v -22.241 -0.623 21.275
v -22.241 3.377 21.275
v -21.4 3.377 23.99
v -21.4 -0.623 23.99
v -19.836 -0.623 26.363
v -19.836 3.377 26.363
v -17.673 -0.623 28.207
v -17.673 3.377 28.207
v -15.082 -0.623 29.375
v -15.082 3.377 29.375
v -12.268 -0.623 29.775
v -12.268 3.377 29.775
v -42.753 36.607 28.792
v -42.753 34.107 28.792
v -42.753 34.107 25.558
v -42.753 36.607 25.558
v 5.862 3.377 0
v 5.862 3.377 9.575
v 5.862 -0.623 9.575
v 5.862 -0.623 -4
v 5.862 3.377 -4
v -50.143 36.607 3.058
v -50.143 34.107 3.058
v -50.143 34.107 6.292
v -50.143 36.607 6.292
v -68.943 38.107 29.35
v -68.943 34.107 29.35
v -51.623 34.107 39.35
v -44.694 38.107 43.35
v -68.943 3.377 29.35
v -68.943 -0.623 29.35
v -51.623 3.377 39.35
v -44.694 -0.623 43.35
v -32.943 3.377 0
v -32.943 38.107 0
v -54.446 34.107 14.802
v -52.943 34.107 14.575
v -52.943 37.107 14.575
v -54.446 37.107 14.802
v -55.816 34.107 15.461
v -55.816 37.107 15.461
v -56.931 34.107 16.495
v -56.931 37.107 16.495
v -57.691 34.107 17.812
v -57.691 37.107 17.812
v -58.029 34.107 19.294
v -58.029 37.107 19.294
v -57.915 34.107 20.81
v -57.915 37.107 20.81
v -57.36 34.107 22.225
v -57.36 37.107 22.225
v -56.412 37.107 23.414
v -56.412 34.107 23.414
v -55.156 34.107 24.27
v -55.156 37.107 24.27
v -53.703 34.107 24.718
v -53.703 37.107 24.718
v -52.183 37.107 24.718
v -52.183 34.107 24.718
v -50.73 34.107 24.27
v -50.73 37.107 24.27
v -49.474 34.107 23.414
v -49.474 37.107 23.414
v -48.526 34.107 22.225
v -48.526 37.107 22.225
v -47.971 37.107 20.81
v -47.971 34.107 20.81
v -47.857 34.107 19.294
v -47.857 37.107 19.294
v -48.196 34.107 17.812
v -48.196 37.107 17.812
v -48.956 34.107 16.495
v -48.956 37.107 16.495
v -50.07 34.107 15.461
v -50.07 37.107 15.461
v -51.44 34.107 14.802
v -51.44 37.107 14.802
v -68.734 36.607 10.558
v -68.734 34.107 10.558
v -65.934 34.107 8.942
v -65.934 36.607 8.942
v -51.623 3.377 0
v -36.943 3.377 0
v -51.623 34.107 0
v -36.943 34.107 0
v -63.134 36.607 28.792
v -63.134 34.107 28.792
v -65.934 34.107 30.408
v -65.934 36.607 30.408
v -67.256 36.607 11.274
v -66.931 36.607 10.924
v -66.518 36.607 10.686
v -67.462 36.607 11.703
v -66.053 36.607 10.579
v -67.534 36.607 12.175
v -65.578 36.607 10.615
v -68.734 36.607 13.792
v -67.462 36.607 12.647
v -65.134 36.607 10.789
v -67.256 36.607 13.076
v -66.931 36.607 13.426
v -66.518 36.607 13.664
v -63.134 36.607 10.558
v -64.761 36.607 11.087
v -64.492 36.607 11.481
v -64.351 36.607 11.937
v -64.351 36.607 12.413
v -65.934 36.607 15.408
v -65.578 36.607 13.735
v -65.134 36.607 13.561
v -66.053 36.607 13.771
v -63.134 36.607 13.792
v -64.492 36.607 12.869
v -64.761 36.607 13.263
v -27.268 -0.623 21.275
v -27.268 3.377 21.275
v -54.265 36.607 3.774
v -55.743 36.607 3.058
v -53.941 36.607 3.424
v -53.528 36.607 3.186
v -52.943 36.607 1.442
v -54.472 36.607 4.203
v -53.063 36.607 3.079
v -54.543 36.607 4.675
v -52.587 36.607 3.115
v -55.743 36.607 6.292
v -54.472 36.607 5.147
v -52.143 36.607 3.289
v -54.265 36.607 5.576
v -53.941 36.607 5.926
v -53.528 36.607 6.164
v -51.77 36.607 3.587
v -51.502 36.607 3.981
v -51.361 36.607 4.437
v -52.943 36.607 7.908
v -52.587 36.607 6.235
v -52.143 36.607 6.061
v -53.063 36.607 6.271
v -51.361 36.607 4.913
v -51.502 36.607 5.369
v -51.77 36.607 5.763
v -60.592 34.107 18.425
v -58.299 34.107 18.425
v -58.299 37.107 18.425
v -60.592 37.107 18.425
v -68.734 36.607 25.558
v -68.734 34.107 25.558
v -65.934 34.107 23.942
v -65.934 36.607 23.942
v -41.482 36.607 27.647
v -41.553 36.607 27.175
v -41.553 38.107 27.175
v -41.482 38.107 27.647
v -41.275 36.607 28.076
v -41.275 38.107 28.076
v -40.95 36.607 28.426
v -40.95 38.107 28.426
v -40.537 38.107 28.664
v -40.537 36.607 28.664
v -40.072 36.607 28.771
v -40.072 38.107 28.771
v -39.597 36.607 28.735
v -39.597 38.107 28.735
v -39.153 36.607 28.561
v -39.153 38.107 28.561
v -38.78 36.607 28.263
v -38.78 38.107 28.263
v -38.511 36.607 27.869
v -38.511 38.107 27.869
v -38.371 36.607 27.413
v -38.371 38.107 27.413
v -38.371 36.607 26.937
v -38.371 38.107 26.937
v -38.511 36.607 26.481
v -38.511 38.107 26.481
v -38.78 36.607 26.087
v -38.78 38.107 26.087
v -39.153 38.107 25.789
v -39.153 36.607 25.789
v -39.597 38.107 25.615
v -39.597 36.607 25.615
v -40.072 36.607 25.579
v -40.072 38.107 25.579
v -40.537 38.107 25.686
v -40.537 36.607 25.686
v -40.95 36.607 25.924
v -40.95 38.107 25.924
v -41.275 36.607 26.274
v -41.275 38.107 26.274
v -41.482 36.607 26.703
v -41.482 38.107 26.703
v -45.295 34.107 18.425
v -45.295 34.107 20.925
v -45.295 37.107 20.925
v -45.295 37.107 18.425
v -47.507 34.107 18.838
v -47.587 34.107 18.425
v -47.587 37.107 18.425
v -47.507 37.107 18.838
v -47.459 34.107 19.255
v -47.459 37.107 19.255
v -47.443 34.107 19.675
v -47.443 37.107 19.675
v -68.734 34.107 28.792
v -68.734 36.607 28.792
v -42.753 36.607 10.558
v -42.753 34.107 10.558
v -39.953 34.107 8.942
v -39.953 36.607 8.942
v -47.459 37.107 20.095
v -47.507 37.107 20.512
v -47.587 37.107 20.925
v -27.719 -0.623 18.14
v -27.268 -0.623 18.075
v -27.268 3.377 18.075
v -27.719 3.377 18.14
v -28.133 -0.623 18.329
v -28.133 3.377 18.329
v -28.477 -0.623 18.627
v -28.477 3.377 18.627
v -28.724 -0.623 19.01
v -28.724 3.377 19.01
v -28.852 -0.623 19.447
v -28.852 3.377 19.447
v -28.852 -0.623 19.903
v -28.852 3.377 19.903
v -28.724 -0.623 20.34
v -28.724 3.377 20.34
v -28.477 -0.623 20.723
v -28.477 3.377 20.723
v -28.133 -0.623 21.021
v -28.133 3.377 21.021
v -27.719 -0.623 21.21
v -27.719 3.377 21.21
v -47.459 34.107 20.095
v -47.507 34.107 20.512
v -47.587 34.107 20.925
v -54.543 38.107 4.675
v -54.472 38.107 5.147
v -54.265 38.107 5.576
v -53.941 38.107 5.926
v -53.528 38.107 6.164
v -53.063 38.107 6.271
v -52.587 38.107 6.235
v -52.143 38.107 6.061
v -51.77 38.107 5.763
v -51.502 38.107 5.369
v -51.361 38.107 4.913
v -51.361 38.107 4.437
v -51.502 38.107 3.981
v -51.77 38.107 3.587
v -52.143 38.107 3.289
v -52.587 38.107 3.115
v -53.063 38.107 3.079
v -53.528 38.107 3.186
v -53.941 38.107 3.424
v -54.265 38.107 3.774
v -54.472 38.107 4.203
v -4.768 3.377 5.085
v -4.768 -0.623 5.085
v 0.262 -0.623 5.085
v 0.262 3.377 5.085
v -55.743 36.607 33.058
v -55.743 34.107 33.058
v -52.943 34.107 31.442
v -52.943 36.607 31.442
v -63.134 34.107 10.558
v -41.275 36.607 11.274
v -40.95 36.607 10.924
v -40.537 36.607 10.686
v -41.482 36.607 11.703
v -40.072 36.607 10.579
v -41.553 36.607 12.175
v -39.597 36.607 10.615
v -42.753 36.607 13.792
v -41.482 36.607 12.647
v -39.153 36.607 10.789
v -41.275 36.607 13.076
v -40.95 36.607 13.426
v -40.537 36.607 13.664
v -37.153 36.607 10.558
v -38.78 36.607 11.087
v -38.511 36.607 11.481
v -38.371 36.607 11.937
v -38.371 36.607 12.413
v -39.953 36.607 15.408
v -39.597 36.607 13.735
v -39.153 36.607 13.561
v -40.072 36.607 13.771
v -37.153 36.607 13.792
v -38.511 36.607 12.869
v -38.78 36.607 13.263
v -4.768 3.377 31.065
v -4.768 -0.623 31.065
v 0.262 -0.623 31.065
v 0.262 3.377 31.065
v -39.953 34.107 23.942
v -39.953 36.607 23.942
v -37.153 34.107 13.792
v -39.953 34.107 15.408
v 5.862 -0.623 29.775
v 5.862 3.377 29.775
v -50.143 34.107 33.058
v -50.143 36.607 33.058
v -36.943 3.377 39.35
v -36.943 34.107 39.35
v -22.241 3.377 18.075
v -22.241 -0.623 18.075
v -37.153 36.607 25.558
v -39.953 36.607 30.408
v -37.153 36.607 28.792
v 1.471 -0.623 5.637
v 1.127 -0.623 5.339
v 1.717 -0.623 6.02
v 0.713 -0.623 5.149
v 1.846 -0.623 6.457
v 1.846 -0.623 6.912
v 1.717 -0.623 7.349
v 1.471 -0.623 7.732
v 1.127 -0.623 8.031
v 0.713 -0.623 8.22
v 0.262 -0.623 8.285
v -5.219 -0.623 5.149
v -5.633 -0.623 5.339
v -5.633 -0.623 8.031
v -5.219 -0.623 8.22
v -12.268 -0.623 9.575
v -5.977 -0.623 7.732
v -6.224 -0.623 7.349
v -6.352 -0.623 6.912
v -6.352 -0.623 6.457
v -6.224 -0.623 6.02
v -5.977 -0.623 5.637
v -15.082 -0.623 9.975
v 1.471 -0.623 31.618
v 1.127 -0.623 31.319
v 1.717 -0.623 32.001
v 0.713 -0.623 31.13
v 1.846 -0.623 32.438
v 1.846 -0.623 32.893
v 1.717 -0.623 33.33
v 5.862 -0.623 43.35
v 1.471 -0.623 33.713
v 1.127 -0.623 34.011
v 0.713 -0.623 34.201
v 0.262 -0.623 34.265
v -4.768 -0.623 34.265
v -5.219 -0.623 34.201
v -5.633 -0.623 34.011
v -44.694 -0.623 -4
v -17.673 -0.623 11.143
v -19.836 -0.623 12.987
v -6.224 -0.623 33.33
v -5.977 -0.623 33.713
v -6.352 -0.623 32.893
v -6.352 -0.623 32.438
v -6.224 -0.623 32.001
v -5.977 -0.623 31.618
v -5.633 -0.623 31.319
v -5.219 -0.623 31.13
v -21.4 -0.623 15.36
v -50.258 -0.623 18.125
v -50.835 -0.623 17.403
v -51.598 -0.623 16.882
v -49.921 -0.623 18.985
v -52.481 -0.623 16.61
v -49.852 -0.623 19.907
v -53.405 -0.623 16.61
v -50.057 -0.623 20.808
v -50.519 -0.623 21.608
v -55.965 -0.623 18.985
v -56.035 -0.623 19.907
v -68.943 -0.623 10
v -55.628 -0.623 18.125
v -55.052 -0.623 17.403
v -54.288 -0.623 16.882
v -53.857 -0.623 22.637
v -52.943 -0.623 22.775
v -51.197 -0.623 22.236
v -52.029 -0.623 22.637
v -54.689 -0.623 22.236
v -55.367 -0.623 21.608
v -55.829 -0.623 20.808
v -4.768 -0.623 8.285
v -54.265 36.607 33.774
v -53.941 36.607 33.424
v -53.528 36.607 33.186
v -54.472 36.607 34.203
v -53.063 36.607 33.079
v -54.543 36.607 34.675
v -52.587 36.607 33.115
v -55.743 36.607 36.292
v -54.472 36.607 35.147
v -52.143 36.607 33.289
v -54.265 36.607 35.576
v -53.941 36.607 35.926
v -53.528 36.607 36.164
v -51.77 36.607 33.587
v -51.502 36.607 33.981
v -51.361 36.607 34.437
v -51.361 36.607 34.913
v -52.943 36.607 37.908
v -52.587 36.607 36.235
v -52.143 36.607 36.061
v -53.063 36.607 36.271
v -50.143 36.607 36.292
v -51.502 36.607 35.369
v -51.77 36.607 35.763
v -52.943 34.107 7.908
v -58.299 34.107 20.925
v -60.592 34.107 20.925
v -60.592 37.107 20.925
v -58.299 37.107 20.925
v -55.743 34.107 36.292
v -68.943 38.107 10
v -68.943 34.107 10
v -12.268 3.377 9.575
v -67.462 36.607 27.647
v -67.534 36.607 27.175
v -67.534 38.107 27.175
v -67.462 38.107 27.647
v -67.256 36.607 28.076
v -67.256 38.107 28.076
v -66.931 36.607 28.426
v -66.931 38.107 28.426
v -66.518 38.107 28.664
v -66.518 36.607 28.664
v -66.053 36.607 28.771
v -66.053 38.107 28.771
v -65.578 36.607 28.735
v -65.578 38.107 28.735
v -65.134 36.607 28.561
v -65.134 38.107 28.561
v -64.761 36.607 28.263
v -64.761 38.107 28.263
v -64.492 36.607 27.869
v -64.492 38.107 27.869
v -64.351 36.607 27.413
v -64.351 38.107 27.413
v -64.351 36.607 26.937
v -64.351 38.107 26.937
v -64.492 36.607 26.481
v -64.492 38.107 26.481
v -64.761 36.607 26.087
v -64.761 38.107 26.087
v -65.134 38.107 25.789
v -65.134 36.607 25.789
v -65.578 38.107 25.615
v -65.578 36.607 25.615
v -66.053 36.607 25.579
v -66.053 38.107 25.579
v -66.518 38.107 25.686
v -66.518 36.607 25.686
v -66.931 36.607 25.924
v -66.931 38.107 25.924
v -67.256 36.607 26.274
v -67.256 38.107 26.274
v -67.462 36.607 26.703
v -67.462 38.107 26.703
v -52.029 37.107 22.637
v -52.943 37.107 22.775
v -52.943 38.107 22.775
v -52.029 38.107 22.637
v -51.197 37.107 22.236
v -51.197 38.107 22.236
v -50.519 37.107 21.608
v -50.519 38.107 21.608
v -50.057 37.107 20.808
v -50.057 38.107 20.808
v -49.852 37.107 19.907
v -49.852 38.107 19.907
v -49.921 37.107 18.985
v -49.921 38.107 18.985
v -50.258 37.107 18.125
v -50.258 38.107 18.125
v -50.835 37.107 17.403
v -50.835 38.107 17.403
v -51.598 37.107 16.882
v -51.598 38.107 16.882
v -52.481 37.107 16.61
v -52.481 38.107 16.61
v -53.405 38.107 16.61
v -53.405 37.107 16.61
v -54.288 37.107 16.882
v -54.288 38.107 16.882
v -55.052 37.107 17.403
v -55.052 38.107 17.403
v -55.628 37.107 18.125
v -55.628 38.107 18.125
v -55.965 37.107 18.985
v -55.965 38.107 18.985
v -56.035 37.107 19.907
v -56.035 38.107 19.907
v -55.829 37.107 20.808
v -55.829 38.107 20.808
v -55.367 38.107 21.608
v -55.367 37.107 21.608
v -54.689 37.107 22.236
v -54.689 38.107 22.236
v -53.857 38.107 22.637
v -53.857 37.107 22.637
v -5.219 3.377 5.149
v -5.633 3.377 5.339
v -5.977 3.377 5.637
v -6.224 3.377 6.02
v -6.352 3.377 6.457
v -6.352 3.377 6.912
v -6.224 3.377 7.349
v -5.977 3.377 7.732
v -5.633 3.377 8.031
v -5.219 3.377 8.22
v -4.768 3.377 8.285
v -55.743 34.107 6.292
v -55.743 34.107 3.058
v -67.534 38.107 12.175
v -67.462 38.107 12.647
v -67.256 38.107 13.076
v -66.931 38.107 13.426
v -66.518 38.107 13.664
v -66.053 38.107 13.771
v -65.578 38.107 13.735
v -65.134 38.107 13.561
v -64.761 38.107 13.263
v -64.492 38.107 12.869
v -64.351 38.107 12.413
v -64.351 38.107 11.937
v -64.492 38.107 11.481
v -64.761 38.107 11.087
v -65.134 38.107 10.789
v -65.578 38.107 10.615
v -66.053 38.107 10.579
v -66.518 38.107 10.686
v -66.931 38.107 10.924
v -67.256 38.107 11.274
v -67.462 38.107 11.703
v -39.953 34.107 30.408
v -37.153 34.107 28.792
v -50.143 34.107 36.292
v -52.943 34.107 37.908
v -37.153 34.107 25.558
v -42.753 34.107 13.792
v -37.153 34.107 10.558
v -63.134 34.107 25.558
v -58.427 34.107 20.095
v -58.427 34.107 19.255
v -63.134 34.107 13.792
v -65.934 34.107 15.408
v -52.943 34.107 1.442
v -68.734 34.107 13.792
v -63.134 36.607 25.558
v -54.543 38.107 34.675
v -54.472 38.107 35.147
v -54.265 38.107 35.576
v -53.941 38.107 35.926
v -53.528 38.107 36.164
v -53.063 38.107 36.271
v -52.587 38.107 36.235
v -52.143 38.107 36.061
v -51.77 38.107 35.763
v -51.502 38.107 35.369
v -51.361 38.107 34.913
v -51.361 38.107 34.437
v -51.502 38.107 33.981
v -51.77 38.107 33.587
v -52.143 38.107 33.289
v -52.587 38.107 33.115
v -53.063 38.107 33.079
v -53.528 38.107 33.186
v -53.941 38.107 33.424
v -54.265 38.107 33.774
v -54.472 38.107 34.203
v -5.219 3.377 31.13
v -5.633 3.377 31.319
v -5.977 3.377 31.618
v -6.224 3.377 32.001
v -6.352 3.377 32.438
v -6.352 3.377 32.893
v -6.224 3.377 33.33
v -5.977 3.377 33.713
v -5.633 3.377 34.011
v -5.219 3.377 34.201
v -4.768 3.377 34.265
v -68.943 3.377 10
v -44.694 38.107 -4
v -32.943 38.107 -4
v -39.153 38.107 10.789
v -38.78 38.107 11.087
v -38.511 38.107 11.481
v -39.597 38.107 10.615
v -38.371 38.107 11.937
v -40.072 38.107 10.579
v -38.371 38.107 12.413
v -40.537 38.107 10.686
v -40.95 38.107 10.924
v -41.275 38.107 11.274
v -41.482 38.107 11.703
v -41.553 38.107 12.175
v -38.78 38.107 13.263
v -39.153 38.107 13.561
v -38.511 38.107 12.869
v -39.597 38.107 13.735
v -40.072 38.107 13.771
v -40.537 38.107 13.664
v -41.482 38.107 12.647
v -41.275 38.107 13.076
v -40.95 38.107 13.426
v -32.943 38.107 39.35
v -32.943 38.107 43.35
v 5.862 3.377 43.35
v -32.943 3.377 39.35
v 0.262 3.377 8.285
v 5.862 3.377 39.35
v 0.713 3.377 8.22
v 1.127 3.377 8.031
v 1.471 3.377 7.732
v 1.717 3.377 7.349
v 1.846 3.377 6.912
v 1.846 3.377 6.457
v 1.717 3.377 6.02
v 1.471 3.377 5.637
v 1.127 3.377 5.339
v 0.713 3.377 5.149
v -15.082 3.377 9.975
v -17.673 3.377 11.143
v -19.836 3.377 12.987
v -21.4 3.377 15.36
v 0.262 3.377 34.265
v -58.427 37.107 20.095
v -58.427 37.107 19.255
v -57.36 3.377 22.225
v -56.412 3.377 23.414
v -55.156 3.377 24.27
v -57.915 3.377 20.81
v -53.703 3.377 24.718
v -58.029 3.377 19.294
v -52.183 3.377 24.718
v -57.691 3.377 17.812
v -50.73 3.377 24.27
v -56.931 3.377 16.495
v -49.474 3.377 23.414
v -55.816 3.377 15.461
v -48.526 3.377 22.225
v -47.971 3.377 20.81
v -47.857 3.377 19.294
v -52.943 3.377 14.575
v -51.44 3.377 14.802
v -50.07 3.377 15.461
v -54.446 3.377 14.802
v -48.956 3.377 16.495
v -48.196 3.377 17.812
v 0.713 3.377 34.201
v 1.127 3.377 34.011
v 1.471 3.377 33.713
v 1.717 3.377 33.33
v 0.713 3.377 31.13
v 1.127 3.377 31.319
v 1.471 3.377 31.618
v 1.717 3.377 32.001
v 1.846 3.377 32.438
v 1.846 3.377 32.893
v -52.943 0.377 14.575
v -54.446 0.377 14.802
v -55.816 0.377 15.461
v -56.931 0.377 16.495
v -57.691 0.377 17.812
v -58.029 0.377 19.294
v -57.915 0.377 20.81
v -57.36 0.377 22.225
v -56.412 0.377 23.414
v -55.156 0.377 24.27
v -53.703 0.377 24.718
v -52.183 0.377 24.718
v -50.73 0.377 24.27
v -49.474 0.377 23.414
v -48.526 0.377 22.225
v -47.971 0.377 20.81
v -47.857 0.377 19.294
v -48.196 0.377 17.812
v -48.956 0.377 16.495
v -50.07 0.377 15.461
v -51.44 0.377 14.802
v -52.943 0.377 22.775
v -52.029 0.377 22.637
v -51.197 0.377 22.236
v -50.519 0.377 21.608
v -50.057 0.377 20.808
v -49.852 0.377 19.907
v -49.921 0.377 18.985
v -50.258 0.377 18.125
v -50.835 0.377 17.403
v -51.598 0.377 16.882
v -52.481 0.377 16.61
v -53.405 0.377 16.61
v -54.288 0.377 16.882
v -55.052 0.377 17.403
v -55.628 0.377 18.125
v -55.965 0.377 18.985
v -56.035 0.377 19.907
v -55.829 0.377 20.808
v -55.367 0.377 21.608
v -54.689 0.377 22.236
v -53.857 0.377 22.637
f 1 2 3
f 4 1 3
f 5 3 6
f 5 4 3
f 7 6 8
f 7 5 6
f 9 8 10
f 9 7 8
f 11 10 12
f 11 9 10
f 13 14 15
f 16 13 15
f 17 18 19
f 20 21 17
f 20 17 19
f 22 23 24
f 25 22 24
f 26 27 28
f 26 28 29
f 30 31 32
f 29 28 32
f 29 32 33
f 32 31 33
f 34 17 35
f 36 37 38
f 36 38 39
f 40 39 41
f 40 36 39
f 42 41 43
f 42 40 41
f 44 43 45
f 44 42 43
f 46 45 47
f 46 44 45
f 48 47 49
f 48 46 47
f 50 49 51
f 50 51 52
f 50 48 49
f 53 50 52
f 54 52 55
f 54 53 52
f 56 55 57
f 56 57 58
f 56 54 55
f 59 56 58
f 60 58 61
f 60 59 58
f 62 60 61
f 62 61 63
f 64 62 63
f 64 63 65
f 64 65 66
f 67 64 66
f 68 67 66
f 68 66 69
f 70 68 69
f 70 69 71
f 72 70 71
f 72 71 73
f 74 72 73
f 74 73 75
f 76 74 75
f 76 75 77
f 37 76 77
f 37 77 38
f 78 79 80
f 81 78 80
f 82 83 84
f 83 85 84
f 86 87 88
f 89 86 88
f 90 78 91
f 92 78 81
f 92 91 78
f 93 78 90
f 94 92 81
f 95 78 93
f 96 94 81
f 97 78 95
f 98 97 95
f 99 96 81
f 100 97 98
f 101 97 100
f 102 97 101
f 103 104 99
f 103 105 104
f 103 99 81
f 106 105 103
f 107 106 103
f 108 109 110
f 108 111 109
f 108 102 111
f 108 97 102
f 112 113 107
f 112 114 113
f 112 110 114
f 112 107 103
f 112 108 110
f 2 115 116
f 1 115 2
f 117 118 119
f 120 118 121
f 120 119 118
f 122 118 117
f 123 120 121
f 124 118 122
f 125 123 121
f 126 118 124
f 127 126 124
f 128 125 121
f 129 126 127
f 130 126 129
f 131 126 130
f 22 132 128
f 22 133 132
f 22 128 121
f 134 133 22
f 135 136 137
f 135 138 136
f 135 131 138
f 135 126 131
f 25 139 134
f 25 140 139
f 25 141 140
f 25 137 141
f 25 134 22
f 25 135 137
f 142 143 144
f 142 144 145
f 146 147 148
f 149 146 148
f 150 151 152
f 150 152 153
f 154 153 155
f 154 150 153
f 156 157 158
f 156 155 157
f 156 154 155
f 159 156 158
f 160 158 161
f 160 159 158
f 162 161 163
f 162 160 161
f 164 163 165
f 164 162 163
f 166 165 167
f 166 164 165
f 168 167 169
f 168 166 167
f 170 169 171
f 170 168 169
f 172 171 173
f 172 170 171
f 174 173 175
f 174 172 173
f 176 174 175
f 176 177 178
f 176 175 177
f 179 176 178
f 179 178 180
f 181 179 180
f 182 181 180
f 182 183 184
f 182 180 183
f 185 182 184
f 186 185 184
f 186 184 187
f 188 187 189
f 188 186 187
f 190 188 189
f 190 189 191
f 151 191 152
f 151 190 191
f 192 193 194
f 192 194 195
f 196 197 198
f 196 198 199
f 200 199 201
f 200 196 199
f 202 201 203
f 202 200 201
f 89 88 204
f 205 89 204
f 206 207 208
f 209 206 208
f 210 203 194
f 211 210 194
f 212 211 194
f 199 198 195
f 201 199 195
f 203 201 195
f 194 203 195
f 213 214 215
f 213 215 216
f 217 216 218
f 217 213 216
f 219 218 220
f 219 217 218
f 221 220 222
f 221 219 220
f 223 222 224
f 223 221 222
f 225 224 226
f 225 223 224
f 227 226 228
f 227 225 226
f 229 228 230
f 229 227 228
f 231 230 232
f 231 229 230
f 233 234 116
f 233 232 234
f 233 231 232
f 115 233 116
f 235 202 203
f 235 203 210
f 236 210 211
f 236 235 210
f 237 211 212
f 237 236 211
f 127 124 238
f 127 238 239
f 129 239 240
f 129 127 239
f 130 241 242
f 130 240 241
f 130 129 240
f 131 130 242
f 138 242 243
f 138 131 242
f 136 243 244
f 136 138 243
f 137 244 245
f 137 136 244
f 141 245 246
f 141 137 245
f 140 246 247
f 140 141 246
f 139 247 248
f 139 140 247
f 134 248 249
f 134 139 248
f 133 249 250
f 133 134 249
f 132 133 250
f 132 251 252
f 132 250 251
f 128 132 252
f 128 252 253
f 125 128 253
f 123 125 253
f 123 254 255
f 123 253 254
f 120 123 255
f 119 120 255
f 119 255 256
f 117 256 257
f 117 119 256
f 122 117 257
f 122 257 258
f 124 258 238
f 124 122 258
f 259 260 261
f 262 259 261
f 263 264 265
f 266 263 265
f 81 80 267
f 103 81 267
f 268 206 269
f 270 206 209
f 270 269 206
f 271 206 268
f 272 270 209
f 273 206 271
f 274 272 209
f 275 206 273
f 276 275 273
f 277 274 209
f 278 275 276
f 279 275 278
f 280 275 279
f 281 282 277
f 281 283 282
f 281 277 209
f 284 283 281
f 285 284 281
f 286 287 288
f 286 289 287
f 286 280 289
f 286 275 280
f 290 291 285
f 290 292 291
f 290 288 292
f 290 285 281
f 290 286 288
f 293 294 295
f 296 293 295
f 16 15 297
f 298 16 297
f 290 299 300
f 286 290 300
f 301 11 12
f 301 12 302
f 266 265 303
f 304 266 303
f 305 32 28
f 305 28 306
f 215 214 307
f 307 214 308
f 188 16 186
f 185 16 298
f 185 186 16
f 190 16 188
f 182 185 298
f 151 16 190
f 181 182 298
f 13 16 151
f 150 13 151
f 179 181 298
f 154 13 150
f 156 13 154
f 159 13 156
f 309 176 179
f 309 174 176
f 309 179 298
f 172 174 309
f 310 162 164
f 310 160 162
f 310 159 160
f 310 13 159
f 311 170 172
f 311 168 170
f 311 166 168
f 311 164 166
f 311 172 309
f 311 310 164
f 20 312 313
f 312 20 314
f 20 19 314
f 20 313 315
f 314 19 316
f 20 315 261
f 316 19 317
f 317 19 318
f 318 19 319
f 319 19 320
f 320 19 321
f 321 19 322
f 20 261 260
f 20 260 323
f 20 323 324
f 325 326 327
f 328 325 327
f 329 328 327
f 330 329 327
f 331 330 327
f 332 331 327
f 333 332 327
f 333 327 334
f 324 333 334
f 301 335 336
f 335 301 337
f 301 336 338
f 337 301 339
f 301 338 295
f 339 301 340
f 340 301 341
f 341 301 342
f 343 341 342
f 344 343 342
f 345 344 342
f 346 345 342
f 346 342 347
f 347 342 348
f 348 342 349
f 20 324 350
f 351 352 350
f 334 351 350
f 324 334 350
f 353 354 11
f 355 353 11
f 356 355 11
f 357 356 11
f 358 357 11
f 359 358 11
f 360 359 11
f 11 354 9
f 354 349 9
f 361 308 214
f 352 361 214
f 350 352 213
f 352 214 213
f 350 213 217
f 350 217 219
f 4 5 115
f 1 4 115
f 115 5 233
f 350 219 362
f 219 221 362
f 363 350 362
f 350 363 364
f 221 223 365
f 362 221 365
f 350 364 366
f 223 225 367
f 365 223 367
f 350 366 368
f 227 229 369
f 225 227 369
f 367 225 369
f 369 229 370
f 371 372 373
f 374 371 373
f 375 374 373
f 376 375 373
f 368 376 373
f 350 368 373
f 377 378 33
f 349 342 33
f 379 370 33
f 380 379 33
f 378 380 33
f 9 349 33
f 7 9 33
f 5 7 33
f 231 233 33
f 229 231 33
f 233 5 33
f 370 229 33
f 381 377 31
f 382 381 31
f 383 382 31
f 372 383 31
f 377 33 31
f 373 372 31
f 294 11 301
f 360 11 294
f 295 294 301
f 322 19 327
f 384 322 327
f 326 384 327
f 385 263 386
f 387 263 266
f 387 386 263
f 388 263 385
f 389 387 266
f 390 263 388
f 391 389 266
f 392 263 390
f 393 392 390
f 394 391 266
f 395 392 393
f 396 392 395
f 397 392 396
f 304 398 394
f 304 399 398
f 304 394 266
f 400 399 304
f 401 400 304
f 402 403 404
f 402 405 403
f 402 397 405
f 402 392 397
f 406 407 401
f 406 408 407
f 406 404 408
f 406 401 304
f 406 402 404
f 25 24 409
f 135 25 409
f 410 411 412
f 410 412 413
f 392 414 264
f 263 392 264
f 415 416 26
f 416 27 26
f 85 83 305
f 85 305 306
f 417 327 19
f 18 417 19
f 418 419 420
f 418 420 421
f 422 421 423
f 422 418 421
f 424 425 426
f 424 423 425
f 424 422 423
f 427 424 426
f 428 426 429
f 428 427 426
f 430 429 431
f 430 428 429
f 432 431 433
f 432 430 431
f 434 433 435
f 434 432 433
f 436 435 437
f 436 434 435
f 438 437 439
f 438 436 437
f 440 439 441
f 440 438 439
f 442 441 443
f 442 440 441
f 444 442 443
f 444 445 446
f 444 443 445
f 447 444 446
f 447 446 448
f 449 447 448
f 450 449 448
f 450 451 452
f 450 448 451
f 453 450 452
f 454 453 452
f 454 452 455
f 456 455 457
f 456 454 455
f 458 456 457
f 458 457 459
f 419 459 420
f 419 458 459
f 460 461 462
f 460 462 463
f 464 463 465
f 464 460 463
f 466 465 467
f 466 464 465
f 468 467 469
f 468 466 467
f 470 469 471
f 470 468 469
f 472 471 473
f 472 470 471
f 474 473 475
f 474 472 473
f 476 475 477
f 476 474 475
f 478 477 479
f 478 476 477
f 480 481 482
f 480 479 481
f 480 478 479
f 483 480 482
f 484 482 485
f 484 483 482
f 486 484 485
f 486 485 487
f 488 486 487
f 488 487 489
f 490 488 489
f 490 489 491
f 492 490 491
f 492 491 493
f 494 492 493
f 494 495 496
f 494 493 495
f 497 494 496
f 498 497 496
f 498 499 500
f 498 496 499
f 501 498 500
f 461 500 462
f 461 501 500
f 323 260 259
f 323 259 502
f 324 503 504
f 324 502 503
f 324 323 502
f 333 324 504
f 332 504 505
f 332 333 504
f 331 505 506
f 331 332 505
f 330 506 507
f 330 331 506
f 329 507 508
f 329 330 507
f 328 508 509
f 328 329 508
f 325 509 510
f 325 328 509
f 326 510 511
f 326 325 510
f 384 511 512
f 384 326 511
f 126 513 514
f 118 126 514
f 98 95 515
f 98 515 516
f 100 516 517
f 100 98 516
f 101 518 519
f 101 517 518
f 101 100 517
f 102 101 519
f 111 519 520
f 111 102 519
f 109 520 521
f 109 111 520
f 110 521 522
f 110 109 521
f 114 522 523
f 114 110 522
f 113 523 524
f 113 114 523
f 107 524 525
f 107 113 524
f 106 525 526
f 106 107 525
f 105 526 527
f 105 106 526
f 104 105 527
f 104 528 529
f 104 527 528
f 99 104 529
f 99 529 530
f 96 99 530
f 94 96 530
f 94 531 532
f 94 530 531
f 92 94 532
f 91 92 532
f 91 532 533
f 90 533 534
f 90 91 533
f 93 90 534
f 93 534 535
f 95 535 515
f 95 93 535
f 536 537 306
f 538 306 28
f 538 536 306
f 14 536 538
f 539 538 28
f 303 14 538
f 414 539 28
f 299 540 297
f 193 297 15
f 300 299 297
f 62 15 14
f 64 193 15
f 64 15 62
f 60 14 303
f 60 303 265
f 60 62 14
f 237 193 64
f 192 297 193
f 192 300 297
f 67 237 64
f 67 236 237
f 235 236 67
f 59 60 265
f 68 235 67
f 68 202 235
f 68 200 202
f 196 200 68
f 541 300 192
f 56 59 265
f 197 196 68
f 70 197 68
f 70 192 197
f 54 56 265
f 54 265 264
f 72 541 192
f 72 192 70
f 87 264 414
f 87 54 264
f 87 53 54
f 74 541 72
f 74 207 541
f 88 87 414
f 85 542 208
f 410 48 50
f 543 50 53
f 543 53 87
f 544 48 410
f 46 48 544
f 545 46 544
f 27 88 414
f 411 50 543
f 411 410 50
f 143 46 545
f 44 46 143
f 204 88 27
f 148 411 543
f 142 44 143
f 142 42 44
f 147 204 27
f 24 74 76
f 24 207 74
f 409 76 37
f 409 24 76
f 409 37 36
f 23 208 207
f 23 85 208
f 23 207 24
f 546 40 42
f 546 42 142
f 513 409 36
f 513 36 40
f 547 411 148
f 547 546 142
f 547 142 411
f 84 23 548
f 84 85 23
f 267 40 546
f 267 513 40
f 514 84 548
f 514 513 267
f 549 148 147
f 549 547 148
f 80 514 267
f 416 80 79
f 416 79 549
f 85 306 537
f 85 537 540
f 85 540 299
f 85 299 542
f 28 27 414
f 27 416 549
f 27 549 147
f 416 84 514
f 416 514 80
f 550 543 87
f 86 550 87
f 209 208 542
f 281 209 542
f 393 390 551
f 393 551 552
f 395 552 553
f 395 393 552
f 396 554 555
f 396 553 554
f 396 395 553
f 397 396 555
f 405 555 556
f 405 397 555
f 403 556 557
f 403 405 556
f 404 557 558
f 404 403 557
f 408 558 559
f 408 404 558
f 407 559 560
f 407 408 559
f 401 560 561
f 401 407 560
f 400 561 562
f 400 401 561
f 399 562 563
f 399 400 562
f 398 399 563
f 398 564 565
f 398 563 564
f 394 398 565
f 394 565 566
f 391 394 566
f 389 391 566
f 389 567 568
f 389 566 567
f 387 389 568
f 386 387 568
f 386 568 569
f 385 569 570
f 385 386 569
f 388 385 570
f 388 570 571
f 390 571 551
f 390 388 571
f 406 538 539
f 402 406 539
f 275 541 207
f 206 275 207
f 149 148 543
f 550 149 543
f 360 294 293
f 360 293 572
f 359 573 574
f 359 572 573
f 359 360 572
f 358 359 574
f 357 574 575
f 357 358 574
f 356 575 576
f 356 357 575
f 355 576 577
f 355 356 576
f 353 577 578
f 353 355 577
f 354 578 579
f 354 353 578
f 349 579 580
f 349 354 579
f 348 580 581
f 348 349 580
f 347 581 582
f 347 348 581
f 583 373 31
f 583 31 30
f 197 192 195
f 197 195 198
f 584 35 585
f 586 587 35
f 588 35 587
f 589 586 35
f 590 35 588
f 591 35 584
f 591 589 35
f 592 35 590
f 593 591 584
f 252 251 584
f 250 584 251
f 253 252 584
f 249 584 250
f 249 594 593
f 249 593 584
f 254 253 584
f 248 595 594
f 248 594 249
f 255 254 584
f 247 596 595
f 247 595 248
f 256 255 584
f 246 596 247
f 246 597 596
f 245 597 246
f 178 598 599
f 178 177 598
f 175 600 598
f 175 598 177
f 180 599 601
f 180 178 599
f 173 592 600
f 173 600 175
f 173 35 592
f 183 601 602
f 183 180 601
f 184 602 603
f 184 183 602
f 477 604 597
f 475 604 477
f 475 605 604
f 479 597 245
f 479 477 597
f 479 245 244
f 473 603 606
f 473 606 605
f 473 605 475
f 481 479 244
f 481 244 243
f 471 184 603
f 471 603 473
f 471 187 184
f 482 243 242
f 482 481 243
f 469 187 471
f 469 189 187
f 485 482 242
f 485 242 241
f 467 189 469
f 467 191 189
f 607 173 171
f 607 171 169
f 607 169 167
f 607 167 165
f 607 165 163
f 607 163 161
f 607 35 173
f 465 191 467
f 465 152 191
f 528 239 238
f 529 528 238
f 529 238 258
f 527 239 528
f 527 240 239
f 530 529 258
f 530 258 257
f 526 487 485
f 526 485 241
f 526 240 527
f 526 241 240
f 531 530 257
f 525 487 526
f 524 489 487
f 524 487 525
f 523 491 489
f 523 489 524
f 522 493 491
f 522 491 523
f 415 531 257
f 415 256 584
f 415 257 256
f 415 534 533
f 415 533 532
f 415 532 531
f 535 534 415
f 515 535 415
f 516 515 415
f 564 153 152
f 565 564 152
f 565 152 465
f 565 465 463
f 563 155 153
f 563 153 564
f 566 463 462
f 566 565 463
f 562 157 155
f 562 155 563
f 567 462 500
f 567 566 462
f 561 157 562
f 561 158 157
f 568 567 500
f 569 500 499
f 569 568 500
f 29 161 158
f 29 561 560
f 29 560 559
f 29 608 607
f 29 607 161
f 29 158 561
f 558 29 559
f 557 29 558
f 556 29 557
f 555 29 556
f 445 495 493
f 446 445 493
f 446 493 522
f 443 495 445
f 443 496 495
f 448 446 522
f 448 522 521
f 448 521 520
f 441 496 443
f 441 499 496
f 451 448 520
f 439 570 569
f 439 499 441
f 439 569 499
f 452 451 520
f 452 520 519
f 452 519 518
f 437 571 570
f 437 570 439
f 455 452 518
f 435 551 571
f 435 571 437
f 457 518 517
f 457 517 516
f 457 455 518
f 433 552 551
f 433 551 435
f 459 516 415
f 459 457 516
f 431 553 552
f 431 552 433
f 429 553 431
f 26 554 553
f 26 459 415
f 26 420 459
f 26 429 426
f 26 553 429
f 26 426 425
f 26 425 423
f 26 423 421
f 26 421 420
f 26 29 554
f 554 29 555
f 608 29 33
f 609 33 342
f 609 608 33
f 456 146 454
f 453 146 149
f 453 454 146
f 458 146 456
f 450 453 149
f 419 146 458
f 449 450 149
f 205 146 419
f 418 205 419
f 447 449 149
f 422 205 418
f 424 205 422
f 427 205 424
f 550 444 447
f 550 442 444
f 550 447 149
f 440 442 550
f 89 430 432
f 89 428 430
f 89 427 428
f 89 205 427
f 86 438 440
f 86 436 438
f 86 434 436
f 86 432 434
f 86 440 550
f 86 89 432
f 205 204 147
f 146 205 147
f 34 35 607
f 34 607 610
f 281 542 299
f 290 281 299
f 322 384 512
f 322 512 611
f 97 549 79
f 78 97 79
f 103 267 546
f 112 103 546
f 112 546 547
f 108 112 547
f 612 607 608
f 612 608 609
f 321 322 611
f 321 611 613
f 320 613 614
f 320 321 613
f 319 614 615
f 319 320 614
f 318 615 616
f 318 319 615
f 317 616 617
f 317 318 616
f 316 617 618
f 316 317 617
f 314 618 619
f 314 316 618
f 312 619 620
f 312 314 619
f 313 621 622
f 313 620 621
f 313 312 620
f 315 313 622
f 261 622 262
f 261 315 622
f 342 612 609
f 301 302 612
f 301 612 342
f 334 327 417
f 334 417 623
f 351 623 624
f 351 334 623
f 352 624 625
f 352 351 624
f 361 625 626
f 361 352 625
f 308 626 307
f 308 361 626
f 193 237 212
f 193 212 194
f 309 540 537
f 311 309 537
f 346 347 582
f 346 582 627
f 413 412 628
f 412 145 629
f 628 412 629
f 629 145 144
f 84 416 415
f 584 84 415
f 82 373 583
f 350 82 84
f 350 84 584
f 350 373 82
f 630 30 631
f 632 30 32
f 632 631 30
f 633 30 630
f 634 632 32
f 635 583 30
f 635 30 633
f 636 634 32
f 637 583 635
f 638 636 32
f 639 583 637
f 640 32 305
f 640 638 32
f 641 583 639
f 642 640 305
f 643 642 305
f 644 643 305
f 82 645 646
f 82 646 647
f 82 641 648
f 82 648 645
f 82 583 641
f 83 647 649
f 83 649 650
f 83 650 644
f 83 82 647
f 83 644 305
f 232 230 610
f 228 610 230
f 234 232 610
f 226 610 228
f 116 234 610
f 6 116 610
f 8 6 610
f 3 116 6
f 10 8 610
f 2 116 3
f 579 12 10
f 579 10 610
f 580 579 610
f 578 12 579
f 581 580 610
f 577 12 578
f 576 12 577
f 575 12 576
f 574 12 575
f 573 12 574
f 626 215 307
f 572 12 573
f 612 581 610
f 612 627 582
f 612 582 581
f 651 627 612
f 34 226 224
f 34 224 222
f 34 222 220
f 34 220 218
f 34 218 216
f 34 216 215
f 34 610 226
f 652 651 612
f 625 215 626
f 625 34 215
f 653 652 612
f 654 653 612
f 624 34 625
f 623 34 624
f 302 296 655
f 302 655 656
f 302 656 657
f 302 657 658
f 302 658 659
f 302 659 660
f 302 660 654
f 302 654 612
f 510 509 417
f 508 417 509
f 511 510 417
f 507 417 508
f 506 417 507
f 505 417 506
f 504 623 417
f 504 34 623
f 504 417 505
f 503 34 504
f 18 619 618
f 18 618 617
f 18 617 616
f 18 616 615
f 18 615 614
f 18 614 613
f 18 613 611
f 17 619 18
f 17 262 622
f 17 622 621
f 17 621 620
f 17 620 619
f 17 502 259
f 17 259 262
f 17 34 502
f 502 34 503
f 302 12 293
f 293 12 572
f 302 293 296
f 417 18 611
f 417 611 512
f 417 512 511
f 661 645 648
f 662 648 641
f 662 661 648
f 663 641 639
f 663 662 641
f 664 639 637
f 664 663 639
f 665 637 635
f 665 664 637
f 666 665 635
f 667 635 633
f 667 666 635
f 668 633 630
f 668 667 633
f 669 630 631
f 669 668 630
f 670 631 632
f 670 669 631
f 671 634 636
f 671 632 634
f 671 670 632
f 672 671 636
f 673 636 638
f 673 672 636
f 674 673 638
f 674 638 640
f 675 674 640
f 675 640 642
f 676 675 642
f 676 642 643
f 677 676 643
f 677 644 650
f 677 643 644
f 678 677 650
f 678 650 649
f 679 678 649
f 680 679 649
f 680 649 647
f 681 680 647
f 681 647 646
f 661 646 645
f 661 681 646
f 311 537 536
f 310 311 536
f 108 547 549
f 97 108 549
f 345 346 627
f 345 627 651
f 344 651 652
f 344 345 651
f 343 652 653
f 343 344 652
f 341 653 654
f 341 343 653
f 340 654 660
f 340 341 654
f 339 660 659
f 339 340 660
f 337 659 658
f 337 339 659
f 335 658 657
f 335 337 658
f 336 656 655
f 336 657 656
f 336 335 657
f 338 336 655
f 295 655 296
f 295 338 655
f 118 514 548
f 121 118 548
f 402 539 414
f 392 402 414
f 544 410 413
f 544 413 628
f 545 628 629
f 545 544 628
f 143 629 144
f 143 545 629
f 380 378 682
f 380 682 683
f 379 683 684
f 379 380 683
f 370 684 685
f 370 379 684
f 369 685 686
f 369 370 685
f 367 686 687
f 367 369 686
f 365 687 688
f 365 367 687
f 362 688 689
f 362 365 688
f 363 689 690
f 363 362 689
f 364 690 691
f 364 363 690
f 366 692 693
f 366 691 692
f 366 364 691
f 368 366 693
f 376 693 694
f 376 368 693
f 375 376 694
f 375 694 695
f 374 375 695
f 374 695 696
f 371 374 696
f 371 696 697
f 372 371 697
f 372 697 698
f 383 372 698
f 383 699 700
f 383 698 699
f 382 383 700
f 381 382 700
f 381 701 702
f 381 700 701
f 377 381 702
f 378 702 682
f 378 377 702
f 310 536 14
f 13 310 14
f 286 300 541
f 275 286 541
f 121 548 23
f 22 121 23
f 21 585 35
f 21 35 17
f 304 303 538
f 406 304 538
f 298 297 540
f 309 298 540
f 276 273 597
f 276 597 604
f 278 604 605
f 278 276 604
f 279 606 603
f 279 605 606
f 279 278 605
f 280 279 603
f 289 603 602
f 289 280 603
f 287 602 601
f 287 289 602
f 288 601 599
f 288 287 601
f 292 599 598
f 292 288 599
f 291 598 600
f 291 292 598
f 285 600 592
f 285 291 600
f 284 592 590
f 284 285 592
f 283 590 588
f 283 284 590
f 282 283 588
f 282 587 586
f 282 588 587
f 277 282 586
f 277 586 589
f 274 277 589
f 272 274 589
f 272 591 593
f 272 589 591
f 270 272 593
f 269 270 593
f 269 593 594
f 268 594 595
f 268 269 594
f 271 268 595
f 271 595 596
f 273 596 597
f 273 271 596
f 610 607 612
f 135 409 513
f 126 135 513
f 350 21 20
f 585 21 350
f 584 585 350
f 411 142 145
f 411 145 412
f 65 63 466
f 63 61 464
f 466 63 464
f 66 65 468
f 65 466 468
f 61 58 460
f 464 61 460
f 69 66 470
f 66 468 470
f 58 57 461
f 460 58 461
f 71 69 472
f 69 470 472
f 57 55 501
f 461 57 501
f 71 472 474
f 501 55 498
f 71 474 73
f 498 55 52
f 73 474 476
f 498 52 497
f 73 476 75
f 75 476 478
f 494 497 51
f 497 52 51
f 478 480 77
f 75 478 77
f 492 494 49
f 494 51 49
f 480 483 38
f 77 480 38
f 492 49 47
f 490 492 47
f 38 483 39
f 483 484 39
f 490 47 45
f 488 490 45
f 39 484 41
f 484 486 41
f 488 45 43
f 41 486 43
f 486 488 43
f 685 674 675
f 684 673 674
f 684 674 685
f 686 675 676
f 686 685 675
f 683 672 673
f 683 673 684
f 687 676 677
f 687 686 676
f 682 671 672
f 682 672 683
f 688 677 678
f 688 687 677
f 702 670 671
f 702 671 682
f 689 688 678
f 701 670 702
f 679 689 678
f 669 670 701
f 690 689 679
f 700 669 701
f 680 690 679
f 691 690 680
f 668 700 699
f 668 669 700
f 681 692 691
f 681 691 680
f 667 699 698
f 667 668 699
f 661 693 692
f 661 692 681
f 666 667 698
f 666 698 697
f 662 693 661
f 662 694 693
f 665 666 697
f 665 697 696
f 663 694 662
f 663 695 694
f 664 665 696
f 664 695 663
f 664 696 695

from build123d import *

# Parameters (mm, degrees)
BOSS_EXTRUDE1_DEPTH     = 39.35
CUT_EXTRUDE2_DEPTH      = 33.73
CUT_EXTRUDE2_DEPTH_BACK = 3
SKETCH3_R               = 5.1
CUT_EXTRUDE3_DEPTH      = 33.73
CUT_EXTRUDE4_DEPTH      = 87.647311883
CUT_EXTRUDE4_DEPTH_BACK = 87.647311883
SKETCH3_5_R             = 3.1
SKETCH3_5_R_2           = 10.1
SKETCH3_5_R_3           = 1.6
SKETCH3_5_W             = 20.675
SKETCH3_5_H             = 20.2
SKETCH3_5_W_2           = 5.027537917
SKETCH3_5_H_2           = 3.2
SKETCH3_5_W_3           = 5.03
SKETCH3_6_R             = 1.6
CUT_EXTRUDE5_DEPTH      = 87.647311883
SKETCH4_W               = 77.35
SKETCH4_H               = 38.73
BOSS_EXTRUDE2_DEPTH     = 4
SKETCH5_W               = 77.35
SKETCH5_H               = 38.73
BOSS_EXTRUDE3_DEPTH     = 4
CUT_EXTRUDE6_DEPTH      = 92.909209967
CUT_EXTRUDE6_DEPTH_BACK = 92.909209967
CUT_EXTRUDE7_DEPTH      = 2.5
CHAMFER1_SIZE           = 14
CHAMFER1_SIZE_2         = 24.248711306


with BuildPart() as part:
    # Sketch1 → Boss-Extrude1 (new body)
    with BuildSketch(Plane.XY):
        Polygon((-68.943174111, 38.106680783), (-32.943174111, 38.106680783), (-32.943174111, 3.376680783), (8.406825889, 3.376680783), (8.406825889, -0.623319217), (-68.943174111, -0.623319217), (-68.943174111, 3.376680783), (-36.943174111, 3.376680783), (-36.943174111, 34.106680783), (-68.943174111, 34.106680783), align=None)
    extrude(amount=BOSS_EXTRUDE1_DEPTH)

    # Sketch3 → Cut-Extrude2 (cut, two sides: drawn at the far end of the back side and taken through both)
    with BuildSketch(Plane(origin=(0, 3.376680783, 0), x_dir=(1, 0, 0), z_dir=(0, 1, 0)).offset(-CUT_EXTRUDE2_DEPTH_BACK)):
        with Locations(Location((-52.943174111, -19.675, 0), (0, 0, 90))):
            Circle(SKETCH3_R)
    extrude(amount=CUT_EXTRUDE2_DEPTH + CUT_EXTRUDE2_DEPTH_BACK, mode=Mode.SUBTRACT)

    # Sketch3<4> → Cut-Extrude3 (cut)
    with BuildSketch(Plane(origin=(0, 3.376680783, 0), x_dir=(1, 0, 0), z_dir=(0, 1, 0))):
        with BuildLine():
            Line((-47.58710279, -20.925), (-45.294644841, -20.925))
            Line((-45.294644841, -20.925), (-45.294644841, -18.425))
            Line((-45.294644841, -18.425), (-47.58710279, -18.425))
            ThreePointArc((-47.58710279, -18.425), (-47.479274758, -19.045870549), (-47.443174111, -19.675))
            ThreePointArc((-47.443174111, -19.675), (-47.479274758, -20.304129451), (-47.58710279, -20.925))
        make_face()
        with BuildLine():
            Line((-60.591703381, -18.425), (-60.591703381, -20.925))
            Line((-60.591703381, -20.925), (-58.299245432, -20.925))
            ThreePointArc((-58.299245432, -20.925), (-58.443174111, -19.675), (-58.299245432, -18.425))
            Line((-58.299245432, -18.425), (-60.591703381, -18.425))
        make_face()
    extrude(amount=CUT_EXTRUDE3_DEPTH, mode=Mode.SUBTRACT)

    # Sketch3<5> → Cut-Extrude4 (cut, two sides: drawn at the far end of the back side and taken through both)
    with BuildSketch(Plane(origin=(0, 3.376680783, 0), x_dir=(1, 0, 0), z_dir=(0, 1, 0)).offset(-CUT_EXTRUDE4_DEPTH_BACK)):
        with Locations(Location((-52.943174111, -19.675, 0), (0, 0, 270))):
            Circle(SKETCH3_5_R)
        with Locations((-12.268174111, -19.675)):
            Circle(SKETCH3_5_R_2)
        with Locations((-4.768174111, -32.665381057)):
            Circle(SKETCH3_5_R_3)
        with Locations((-4.768174111, -6.684618943)):
            Circle(SKETCH3_5_R_3)
        with Locations((-27.268174111, -19.675)):
            Circle(SKETCH3_5_R_3)
        with Locations((0.261825889, -32.665381057)):
            Circle(SKETCH3_5_R_3)
        with Locations((0.261825889, -6.684618943)):
            Circle(SKETCH3_5_R_3)
        with Locations((-1.930674111, -19.675)):
            Rectangle(SKETCH3_5_W, SKETCH3_5_H)
        with Locations((-24.754405152, -19.675)):
            Rectangle(SKETCH3_5_W_2, SKETCH3_5_H_2)
        with Locations((-2.253174111, -32.665381057)):
            Rectangle(SKETCH3_5_W_3, SKETCH3_5_H_2)
        with Locations((-2.253174111, -6.684618943)):
            Rectangle(SKETCH3_5_W_3, SKETCH3_5_H_2)
    extrude(amount=CUT_EXTRUDE4_DEPTH + CUT_EXTRUDE4_DEPTH_BACK, mode=Mode.SUBTRACT)

    # Sketch3<6> → Cut-Extrude5 (cut, through all)
    with BuildSketch(Plane(origin=(0, 3.376680783, 0), x_dir=(1, 0, 0), z_dir=(0, 1, 0))):
        with Locations(Location((-52.943174111, -34.675, 0), (0, 0, 180))):
            Circle(SKETCH3_6_R)
        with Locations(Location((-65.933555168, -27.175, 0), (0, 0, 180))):
            Circle(SKETCH3_6_R)
        with Locations(Location((-65.933555168, -12.175, 0), (0, 0, 180))):
            Circle(SKETCH3_6_R)
        with Locations(Location((-52.943174111, -4.675, 0), (0, 0, 180))):
            Circle(SKETCH3_6_R)
        with Locations(Location((-39.952793054, -12.175, 0), (0, 0, 180))):
            Circle(SKETCH3_6_R)
        with Locations(Location((-39.952793054, -27.175, 0), (0, 0, 180))):
            Circle(SKETCH3_6_R)
    extrude(amount=CUT_EXTRUDE5_DEPTH, mode=Mode.SUBTRACT)

    # Sketch4 → Boss-Extrude2 (add)
    with BuildSketch(Plane.XY.offset(39.35)):
        with Locations((-30.268174111, 18.741680783)):
            Rectangle(SKETCH4_W, SKETCH4_H)
    extrude(amount=BOSS_EXTRUDE2_DEPTH)

    # Sketch5 → Boss-Extrude3 (add)
    with BuildSketch(Plane(origin=(0, 0, 0), x_dir=(-1, 0, 0), z_dir=(0, 0, -1))):
        with Locations((30.268174111, 18.741680783)):
            Rectangle(SKETCH5_W, SKETCH5_H)
    extrude(amount=BOSS_EXTRUDE3_DEPTH)

    # Sketch6 → Cut-Extrude6 (cut, two sides: drawn at the far end of the back side and taken through both)
    with BuildSketch(Plane.XY.offset(43.35).offset(-CUT_EXTRUDE6_DEPTH_BACK)):
        Polygon((-32.943174111, 38.106680783), (5.861825889, 3.376680783), (5.861825889, -0.623319217), (8.406825889, -0.623319217), (8.406825889, 38.106680783), align=None)
    extrude(amount=CUT_EXTRUDE6_DEPTH + CUT_EXTRUDE6_DEPTH_BACK, mode=Mode.SUBTRACT)

    # Sketch8 → Cut-Extrude7 (cut)
    with BuildSketch(Plane.XZ.offset(-34.106680783)):
        Polygon((-65.933555168, 15.408161507), (-68.733555168, 13.791580754), (-68.733555168, 10.558419246), (-65.933555168, 8.941838493), (-63.133555168, 10.558419246), (-63.133555168, 13.791580754), align=None)
        Polygon((-65.933555168, 30.408161507), (-68.733555168, 28.791580754), (-68.733555168, 25.558419246), (-65.933555168, 23.941838493), (-63.133555168, 25.558419246), (-63.133555168, 28.791580754), align=None)
        Polygon((-52.943174111, 1.441838493), (-50.143174111, 3.058419246), (-50.143174111, 6.291580754), (-52.943174111, 7.908161507), (-55.743174111, 6.291580754), (-55.743174111, 3.058419246), align=None)
        Polygon((-39.952793054, 8.941838493), (-37.152793054, 10.558419246), (-37.152793054, 13.791580754), (-39.952793054, 15.408161507), (-42.752793054, 13.791580754), (-42.752793054, 10.558419246), align=None)
        Polygon((-39.952793054, 23.941838493), (-37.152793054, 25.558419246), (-37.152793054, 28.791580754), (-39.952793054, 30.408161507), (-42.752793054, 28.791580754), (-42.752793054, 25.558419246), align=None)
        Polygon((-52.943174111, 37.908161507), (-55.743174111, 36.291580754), (-55.743174111, 33.058419246), (-52.943174111, 31.441838493), (-50.143174111, 33.058419246), (-50.143174111, 36.291580754), align=None)
    extrude(amount=-CUT_EXTRUDE7_DEPTH, mode=Mode.SUBTRACT)

    # Chamfer1
    # the kernel refuses this chamfer: 24.248711306, 14 mm, written as the material it takes off along each edge
    with BuildSketch(Plane(origin=(-68.943174111, -63.356814805, 43.35), x_dir=(-0.05789386240267122, 0, -0.9983227437537925), z_dir=(0, 1, 0))) as chamfer1_piece_1:
        Polygon((CHAMFER1_SIZE * 0.998322743754, -CHAMFER1_SIZE * 0.0578938624027), (-CHAMFER1_SIZE_2 * 0.0578938624026, -CHAMFER1_SIZE_2 * 0.998322743752), (0, 0), align=None)
    extrude(amount=164.196991176, mode=Mode.SUBTRACT)
    with BuildSketch(Plane(origin=(-68.943174111, -63.356814805, -4), x_dir=(-0.05789386240267123, 0, 0.9983227437537925), z_dir=(0, 1, 0))) as chamfer1_piece_2:
        Polygon((CHAMFER1_SIZE * 0.998322743754, CHAMFER1_SIZE * 0.0578938624027), (-CHAMFER1_SIZE_2 * 0.0578938624026, CHAMFER1_SIZE_2 * 0.998322743752), (0, 0), align=None)
    extrude(amount=164.196991176, mode=Mode.SUBTRACT)


solid = part.part
